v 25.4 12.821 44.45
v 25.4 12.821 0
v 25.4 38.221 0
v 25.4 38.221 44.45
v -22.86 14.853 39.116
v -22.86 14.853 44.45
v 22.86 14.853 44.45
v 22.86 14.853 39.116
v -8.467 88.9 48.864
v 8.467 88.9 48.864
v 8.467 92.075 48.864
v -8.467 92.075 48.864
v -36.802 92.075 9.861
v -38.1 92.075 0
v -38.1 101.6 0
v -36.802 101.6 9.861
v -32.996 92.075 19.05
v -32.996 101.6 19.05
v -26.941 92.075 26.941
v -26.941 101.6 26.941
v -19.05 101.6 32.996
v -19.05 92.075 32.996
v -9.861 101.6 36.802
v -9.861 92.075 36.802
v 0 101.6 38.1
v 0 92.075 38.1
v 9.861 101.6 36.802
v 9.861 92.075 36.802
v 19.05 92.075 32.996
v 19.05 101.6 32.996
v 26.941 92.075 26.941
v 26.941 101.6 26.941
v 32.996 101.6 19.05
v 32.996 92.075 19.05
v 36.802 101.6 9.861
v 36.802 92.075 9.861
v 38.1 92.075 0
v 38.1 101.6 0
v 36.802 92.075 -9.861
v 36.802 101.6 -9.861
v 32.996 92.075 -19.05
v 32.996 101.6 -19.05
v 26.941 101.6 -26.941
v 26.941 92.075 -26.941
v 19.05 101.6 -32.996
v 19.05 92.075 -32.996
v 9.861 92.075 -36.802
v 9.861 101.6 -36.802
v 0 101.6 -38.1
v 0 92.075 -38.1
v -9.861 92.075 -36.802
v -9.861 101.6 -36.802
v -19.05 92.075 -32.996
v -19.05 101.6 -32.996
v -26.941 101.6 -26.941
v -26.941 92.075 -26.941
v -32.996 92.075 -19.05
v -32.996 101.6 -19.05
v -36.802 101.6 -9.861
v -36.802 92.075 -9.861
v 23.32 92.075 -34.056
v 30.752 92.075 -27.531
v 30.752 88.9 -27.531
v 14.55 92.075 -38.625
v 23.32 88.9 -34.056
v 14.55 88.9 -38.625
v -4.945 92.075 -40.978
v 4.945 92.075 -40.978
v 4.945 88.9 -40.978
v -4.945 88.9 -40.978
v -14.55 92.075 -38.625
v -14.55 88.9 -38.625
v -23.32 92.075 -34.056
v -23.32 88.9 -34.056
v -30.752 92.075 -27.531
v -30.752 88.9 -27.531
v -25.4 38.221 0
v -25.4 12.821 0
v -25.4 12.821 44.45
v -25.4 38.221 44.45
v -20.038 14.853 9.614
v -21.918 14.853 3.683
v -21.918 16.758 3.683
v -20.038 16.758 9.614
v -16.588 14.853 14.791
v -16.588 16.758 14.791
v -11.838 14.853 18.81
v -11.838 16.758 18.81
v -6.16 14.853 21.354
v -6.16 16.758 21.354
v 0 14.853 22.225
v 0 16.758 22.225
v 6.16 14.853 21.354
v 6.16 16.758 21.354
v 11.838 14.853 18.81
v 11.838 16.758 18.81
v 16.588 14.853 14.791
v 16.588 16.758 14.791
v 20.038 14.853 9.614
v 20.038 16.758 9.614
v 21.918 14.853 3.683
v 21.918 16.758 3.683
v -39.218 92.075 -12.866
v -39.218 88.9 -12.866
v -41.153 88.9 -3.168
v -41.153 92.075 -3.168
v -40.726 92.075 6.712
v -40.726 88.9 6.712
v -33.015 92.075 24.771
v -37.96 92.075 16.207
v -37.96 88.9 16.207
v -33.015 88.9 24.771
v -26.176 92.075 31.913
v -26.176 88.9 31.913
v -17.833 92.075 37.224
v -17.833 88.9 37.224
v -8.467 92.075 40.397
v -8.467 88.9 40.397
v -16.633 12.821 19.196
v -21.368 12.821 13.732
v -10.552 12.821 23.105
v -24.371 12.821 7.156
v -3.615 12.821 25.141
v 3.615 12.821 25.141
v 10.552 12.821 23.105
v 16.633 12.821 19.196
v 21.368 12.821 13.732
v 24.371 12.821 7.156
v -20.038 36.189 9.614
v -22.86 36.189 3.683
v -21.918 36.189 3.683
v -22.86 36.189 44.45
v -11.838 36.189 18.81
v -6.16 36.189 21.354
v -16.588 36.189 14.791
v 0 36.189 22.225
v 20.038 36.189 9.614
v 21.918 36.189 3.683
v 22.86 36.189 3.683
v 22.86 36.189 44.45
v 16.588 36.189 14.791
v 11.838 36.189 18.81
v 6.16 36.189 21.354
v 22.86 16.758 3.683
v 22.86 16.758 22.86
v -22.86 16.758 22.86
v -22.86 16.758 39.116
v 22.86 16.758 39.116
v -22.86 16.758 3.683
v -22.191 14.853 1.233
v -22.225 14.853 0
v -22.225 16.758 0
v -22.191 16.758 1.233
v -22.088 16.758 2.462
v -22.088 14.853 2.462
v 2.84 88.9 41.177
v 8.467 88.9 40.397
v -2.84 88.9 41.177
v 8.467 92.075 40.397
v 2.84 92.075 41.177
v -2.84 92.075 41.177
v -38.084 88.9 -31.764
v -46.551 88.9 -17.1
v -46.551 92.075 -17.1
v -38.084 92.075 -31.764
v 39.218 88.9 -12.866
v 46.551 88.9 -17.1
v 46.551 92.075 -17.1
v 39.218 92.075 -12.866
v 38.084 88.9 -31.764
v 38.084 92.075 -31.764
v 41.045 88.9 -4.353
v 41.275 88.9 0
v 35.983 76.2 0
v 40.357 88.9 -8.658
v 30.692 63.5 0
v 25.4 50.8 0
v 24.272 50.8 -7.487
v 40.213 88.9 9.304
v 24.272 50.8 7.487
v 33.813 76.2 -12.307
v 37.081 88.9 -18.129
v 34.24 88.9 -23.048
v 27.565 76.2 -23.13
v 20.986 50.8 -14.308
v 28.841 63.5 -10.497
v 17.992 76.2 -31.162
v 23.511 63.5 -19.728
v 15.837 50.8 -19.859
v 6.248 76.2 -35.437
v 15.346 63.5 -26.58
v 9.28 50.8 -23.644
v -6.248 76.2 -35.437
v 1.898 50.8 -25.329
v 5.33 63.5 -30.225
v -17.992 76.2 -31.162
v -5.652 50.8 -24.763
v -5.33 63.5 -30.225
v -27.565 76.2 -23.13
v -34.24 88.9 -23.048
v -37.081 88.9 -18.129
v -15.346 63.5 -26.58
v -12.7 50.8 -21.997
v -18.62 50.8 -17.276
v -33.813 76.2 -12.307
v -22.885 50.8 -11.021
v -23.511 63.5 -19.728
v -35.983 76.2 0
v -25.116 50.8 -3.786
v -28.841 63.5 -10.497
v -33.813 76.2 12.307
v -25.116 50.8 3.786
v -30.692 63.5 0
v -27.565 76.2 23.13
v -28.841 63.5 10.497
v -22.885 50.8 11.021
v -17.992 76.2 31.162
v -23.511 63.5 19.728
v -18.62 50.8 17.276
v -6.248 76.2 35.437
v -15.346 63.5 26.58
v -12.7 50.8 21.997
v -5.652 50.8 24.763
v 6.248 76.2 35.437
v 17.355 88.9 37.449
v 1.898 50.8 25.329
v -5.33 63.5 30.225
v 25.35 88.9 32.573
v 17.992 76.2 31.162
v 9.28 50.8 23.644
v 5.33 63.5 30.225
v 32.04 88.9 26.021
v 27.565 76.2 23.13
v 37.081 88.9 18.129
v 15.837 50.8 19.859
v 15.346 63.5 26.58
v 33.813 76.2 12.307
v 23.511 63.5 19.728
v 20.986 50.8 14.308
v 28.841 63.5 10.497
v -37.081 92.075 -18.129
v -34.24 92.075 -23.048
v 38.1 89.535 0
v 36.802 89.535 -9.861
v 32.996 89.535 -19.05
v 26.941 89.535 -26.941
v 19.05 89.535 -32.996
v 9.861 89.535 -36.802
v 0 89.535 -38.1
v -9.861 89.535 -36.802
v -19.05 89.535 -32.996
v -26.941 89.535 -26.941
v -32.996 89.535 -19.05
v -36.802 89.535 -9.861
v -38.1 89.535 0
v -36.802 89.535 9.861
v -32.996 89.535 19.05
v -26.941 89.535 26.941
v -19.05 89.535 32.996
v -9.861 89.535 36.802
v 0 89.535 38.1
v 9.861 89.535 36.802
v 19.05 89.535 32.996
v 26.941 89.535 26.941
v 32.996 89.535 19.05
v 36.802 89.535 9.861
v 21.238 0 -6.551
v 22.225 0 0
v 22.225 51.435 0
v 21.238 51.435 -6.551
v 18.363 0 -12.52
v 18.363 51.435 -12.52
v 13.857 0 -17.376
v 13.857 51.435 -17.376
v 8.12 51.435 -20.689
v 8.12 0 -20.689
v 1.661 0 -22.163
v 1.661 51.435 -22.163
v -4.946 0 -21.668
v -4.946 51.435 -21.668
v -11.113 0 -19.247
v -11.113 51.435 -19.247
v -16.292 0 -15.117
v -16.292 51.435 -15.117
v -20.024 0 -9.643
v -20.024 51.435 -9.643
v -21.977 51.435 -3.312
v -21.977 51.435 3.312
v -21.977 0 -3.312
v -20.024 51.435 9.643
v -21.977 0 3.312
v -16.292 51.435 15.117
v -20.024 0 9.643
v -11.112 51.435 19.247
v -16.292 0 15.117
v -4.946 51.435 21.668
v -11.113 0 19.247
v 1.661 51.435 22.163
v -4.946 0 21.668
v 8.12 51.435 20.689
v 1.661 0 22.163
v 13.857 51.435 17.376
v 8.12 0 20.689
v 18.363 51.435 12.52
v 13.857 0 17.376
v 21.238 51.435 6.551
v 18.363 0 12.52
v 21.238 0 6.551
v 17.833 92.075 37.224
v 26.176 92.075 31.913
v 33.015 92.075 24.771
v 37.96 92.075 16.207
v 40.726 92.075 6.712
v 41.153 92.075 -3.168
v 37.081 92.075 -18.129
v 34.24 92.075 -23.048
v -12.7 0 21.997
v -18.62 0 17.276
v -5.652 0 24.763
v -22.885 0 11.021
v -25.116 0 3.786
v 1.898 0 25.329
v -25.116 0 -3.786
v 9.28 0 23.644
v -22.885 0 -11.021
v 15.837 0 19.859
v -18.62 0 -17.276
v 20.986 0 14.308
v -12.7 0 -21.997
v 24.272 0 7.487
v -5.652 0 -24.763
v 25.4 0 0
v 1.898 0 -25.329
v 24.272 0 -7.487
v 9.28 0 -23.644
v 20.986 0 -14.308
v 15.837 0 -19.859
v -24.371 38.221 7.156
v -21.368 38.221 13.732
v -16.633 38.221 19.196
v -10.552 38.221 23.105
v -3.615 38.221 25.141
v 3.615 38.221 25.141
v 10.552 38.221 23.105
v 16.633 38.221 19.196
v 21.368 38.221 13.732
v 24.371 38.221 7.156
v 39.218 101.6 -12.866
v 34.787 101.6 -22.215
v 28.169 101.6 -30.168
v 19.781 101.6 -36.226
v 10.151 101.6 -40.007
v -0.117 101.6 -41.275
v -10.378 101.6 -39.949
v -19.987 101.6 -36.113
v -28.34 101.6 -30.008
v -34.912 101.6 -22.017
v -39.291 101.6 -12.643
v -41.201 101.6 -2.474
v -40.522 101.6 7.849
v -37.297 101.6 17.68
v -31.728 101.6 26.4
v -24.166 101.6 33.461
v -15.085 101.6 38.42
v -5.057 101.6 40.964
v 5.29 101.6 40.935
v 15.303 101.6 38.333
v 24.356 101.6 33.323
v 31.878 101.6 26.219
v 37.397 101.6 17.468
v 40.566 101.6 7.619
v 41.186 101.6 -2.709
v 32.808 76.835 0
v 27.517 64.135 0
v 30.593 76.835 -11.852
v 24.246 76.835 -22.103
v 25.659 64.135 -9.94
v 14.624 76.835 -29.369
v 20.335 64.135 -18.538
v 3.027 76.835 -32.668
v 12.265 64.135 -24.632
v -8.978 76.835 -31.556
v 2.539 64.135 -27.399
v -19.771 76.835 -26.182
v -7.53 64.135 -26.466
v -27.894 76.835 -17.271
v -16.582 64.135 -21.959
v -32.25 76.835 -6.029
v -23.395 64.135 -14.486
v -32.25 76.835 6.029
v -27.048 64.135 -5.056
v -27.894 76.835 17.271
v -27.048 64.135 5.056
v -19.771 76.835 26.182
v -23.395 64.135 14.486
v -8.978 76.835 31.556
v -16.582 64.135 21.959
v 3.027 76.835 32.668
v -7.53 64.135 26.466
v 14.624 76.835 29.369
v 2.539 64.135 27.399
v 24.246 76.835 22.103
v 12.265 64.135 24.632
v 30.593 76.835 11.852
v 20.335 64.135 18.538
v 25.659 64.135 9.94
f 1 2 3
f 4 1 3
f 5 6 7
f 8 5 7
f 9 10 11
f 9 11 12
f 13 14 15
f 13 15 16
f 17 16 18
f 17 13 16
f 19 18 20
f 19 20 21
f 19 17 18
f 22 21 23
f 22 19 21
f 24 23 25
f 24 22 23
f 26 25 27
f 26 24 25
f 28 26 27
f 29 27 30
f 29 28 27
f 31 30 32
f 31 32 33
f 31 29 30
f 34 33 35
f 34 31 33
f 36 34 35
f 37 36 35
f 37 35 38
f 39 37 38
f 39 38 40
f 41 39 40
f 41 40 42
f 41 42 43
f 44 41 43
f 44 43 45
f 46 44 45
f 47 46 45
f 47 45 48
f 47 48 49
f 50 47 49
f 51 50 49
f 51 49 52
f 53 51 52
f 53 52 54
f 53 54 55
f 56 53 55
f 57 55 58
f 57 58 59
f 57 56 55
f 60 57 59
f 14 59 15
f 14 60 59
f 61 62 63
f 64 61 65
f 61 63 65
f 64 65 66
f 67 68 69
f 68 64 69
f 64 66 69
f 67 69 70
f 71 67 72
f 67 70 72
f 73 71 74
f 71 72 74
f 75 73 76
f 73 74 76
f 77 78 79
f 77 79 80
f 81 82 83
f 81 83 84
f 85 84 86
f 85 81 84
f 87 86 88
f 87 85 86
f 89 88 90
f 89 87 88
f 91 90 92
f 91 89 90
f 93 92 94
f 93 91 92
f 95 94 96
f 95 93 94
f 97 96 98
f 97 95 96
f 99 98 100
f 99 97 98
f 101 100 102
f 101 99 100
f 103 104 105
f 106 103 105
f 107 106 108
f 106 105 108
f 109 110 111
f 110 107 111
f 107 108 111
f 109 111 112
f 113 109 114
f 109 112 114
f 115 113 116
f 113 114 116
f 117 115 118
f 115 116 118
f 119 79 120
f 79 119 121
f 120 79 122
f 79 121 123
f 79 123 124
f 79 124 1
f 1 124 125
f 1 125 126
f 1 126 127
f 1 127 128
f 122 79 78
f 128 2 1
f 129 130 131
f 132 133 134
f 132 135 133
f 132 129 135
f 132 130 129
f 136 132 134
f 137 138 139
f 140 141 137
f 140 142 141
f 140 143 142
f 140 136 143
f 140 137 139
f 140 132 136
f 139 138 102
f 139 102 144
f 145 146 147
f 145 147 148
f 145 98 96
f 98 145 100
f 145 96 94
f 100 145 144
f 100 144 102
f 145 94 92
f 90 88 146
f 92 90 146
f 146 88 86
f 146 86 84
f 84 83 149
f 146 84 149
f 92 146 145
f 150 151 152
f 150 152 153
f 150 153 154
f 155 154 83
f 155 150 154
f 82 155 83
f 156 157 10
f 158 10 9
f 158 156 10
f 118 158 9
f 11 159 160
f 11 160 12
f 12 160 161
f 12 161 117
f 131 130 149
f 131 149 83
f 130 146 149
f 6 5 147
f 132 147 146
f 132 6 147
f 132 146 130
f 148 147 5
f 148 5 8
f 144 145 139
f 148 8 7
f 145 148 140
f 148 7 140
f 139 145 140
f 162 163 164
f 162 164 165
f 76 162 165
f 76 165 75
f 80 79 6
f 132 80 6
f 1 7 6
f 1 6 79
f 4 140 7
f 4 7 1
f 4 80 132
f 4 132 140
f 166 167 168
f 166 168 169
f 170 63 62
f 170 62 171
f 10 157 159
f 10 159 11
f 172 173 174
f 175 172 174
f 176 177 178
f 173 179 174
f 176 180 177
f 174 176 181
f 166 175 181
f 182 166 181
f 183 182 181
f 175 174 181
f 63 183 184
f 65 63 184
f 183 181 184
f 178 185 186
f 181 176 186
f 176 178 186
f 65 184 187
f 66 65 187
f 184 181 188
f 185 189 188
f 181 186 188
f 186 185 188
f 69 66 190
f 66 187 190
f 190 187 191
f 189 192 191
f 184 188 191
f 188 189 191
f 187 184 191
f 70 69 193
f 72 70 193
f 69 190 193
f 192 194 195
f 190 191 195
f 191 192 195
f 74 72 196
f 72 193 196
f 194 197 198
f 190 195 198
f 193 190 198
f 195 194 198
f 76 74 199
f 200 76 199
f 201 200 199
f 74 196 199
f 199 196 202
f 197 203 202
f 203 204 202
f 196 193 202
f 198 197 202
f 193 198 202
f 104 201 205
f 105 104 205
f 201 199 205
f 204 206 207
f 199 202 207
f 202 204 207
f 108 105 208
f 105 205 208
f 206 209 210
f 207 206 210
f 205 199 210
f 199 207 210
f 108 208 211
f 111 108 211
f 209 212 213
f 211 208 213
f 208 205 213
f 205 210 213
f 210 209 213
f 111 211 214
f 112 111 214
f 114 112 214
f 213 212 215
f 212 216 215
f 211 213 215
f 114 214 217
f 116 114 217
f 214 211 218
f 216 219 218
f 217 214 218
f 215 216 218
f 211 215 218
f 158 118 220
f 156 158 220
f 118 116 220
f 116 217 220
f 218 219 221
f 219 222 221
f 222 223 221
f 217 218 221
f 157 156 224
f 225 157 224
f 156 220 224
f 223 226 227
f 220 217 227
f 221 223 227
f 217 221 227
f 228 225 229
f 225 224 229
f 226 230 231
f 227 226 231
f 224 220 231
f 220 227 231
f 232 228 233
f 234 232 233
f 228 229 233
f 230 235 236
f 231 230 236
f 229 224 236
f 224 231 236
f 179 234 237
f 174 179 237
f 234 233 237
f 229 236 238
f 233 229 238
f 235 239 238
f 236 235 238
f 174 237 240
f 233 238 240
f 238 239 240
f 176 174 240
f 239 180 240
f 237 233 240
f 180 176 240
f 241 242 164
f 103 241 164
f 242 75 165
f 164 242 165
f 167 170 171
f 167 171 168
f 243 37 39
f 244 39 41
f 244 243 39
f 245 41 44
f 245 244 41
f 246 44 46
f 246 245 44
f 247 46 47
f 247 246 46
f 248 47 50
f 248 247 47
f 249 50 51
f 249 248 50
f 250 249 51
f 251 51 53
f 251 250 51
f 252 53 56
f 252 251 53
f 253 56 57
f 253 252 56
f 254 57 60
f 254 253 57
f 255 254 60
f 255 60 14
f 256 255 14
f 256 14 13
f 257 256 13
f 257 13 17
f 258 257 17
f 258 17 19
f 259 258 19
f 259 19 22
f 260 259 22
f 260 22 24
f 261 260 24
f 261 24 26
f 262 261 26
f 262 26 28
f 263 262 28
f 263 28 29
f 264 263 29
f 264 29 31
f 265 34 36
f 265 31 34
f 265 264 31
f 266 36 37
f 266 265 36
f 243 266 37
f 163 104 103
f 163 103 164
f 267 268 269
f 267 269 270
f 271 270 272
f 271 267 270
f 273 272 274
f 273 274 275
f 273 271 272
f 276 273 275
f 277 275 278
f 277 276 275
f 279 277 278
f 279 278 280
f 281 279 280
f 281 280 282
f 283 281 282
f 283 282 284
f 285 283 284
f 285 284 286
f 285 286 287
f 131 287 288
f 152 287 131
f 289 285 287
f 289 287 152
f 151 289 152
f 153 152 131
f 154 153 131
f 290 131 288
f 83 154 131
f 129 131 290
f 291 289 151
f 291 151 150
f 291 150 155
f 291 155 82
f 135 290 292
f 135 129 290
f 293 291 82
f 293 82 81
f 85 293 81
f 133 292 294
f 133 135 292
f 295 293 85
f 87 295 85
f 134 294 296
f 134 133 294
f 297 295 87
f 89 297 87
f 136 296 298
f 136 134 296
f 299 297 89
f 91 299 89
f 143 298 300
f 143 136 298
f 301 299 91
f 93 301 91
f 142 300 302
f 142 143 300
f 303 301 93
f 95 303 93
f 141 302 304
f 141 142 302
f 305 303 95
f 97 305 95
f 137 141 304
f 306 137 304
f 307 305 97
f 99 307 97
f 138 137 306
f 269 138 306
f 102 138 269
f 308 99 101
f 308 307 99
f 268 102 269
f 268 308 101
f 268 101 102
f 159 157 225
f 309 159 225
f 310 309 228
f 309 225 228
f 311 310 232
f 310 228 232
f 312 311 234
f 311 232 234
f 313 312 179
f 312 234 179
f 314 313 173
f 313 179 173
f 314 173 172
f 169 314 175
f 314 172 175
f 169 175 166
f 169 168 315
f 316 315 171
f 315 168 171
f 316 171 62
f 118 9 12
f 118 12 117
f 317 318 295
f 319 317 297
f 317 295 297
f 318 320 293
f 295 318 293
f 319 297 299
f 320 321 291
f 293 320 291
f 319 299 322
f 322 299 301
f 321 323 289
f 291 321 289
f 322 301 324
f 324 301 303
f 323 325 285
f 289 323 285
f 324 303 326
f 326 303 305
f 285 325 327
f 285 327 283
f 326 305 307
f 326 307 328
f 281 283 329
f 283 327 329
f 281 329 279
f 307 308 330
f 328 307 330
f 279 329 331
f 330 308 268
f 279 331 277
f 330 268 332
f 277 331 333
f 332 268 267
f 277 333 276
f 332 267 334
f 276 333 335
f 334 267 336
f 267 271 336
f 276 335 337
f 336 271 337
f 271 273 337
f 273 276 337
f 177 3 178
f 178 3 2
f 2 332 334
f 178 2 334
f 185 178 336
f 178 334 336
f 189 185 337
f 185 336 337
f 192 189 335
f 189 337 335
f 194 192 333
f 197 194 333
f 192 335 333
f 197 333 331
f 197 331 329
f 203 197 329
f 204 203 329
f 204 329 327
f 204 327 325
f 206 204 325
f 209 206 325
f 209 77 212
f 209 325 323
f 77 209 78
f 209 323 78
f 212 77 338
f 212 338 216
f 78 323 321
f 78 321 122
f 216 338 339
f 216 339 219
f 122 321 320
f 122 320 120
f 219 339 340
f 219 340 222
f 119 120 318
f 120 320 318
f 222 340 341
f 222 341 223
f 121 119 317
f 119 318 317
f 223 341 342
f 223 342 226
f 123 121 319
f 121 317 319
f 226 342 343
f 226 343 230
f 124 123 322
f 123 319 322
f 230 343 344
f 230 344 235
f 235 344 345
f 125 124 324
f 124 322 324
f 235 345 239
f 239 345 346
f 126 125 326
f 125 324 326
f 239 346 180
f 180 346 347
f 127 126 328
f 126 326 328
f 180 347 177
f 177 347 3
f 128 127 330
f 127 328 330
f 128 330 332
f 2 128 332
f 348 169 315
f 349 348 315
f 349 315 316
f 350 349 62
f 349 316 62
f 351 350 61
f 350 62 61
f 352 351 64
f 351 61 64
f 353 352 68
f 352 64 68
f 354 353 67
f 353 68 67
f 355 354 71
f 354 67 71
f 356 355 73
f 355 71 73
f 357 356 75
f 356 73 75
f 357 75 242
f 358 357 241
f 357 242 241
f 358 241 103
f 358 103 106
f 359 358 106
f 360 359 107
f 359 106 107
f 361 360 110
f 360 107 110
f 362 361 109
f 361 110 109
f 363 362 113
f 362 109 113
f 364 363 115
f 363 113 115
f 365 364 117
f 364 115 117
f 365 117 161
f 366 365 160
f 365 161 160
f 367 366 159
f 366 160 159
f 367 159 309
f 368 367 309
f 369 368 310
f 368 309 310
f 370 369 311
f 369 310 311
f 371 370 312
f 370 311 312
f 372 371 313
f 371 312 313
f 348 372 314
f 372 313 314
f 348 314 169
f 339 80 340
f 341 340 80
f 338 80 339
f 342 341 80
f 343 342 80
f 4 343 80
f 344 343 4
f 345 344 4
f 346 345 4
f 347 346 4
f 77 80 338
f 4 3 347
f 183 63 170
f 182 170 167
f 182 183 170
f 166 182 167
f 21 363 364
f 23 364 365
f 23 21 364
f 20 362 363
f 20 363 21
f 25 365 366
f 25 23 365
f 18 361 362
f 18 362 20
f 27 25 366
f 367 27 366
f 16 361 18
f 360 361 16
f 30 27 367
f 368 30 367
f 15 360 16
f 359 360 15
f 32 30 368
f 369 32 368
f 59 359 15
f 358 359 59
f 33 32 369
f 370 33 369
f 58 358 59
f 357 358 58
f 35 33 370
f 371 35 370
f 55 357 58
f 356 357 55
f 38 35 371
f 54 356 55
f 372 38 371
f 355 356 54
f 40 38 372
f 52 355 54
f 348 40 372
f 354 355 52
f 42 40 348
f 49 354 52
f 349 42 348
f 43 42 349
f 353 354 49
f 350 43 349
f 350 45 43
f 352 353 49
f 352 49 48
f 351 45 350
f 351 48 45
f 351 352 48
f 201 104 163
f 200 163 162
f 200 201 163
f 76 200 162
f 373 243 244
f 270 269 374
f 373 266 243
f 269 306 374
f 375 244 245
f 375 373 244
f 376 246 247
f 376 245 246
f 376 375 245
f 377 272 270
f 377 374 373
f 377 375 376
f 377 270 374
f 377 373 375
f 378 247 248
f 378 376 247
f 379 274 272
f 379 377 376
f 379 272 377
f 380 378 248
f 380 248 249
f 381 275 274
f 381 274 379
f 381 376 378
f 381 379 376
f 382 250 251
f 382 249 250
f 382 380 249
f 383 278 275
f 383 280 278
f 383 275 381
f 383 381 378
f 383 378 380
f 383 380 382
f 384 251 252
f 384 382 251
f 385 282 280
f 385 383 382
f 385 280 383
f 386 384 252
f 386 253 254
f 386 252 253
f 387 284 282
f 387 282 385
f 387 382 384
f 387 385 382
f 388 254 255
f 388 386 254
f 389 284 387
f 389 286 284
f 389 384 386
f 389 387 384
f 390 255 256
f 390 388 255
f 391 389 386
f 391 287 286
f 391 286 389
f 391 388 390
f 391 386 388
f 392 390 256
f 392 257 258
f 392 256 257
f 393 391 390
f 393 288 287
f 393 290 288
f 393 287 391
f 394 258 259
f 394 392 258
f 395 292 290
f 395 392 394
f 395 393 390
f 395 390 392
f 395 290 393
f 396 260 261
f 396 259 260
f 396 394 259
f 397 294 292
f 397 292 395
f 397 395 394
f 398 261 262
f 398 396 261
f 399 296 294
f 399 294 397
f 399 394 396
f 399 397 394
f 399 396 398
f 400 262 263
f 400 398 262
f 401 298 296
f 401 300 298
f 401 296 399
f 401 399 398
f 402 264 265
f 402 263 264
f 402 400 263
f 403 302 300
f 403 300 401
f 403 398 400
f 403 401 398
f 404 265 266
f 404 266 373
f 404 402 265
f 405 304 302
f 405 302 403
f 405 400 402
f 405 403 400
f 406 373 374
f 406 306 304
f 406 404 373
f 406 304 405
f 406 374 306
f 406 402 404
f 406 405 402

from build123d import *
from build123d.topology import SkipClean

# Parameters (mm, degrees)
SHELL1_T                = -3.175
BOSS_EXTRUDE1_START     = -3.175
BOSS_EXTRUDE1_DEPTH     = 3.175
CIRPATTERN1_COUNT       = 3
SKETCH4_W               = 50.8
SKETCH4_H               = 25.4
BOSS_EXTRUDE2_DEPTH     = 44.45
CUT_EXTRUDE1_DEPTH      = 87.342151299
CUT_EXTRUDE1_DEPTH_BACK = 87.342151299
SKETCH5_R               = 22.225
SKETCH6_W               = 45.72
SKETCH6_H               = 21.336
CUT_EXTRUDE2_DEPTH      = 40.767
BOSS_EXTRUDE3_DEPTH     = 1.905
SKETCH8_W               = 45.72
SKETCH8_H               = 1.905
BOSS_EXTRUDE4_DEPTH     = 16.256
SKETCH10_R              = 41.275
SKETCH10_R_2            = 38.1
BOSS_EXTRUDE5_DEPTH     = 9.525


with BuildPart() as part:
    # Sketch1 → Revolve1 (revolve)
    with BuildSketch(Plane.XY, mode=Mode.PRIVATE) as revolve1_sk:
        Polygon((0, 92.075), (-41.275, 92.075), (-41.275, 88.9), (-25.4, 50.8), (-25.4, 0), (0, 0), align=None)
    revolve(revolve1_sk.sketch.rotate(Axis((0, 0, 0), (0, 1, 0)), 180), axis=Axis((0, 0, 0), (0, 1, 0)))

    # Shell1
    shell1_openings = [part.faces().sort_by_distance(p)[0] for p in [
        (0, 0, 0),
        (0, 92.075, 0),
    ]]
    offset(amount=SHELL1_T, openings=shell1_openings, kind=Kind.INTERSECTION)

    # Sketch2 → Boss-Extrude1 (add)
    with BuildSketch(Plane(origin=(0, 92.075, 0), x_dir=(1, 0, 0), z_dir=(0, 1, 0)).offset(BOSS_EXTRUDE1_START)):
        with BuildLine():
            Line((0, -48.863958414), (-8.466666667, -48.863958414))
            Line((-8.466666667, -48.863958414), (-8.466666667, -40.397291748))
            ThreePointArc((-8.466666667, -40.397291748), (0, -41.275), (8.466666667, -40.397291748))
            Line((8.466666667, -40.397291748), (8.466666667, -48.863958414))
            Line((8.466666667, -48.863958414), (0, -48.863958414))
        make_face()
    boss_extrude1 = extrude(amount=BOSS_EXTRUDE1_DEPTH)

    # CirPattern1: Boss-Extrude1 ×3 about axis
    cirpattern1_axis = Axis((0, 0, 0), (0, 1, 0))
    for i in range(1, CIRPATTERN1_COUNT):
        add(boss_extrude1.rotate(cirpattern1_axis, i * 360 / CIRPATTERN1_COUNT))

    # Sketch4 → Boss-Extrude2 (add)
    with BuildSketch(Plane.XY):
        with Locations((0, 25.520500134)):
            Rectangle(SKETCH4_W, SKETCH4_H)
    extrude(amount=BOSS_EXTRUDE2_DEPTH)

    # Sketch5 → Cut-Extrude1 (cut, two sides: drawn at the far end of the back side and taken through both)
    with BuildSketch(Plane(origin=(0, 38.220500134, 0), x_dir=(1, 0, 0), z_dir=(0, 1, 0)).offset(-CUT_EXTRUDE1_DEPTH_BACK)):
        with Locations(Location((0, 0, 0), (0, 0, 180))):
            Circle(SKETCH5_R)
    extrude(amount=CUT_EXTRUDE1_DEPTH + CUT_EXTRUDE1_DEPTH_BACK, mode=Mode.SUBTRACT)

    # Sketch6 → Cut-Extrude2 (cut)
    with BuildSketch(Plane.XY.offset(44.45)):
        with Locations((0, 25.520500134)):
            Rectangle(SKETCH6_W, SKETCH6_H)
    extrude(amount=-CUT_EXTRUDE2_DEPTH, mode=Mode.SUBTRACT)

    # Sketch7 → Boss-Extrude3 (add)
    with SkipClean():  # the faces are left unmerged after this step: merging them gives an invalid solid
        with BuildSketch(Plane(origin=(0, 14.852500134, 0), x_dir=(1, 0, 0), z_dir=(0, 1, 0))):
            with BuildLine():
                Line((0, -22.860352775), (-22.86, -22.860352775))
                Line((-22.86, -22.860352775), (-22.860352775, 0))
                Line((-22.860352775, 0), (-22.225, 0))
                ThreePointArc((-22.225, 0), (-1.847898428, -22.148044979), (21.917712837, -3.683))
                Line((21.917712837, -3.683), (22.86, -3.683))
                Line((22.86, -3.683), (22.860352775, 0))
                Line((22.860352775, 0), (22.86, -22.860352775))
                Line((22.86, -22.860352775), (0, -22.860352775))
            make_face()
        extrude(amount=BOSS_EXTRUDE3_DEPTH)

    # Sketch8 → Boss-Extrude4 (add)
    with SkipClean():  # the faces are left unmerged after this step: merging them gives an invalid solid
        with BuildSketch(Plane.XY.offset(22.860352775)):
            with Locations((0, 15.805000134)):
                Rectangle(SKETCH8_W, SKETCH8_H)
        extrude(amount=BOSS_EXTRUDE4_DEPTH)

    # Sketch10 → Boss-Extrude5 (add)
    with BuildSketch(Plane(origin=(0, 92.075, 0), x_dir=(1, 0, 0), z_dir=(0, 1, 0))):
        with Locations(Location((0, 0, 0), (0, 0, 18.162995844))):
            Circle(SKETCH10_R)
        with Locations(Location((0, 0, 0), (0, 0, 180))):
            Circle(SKETCH10_R_2, mode=Mode.SUBTRACT)
    extrude(amount=BOSS_EXTRUDE5_DEPTH)


solid = part.part
